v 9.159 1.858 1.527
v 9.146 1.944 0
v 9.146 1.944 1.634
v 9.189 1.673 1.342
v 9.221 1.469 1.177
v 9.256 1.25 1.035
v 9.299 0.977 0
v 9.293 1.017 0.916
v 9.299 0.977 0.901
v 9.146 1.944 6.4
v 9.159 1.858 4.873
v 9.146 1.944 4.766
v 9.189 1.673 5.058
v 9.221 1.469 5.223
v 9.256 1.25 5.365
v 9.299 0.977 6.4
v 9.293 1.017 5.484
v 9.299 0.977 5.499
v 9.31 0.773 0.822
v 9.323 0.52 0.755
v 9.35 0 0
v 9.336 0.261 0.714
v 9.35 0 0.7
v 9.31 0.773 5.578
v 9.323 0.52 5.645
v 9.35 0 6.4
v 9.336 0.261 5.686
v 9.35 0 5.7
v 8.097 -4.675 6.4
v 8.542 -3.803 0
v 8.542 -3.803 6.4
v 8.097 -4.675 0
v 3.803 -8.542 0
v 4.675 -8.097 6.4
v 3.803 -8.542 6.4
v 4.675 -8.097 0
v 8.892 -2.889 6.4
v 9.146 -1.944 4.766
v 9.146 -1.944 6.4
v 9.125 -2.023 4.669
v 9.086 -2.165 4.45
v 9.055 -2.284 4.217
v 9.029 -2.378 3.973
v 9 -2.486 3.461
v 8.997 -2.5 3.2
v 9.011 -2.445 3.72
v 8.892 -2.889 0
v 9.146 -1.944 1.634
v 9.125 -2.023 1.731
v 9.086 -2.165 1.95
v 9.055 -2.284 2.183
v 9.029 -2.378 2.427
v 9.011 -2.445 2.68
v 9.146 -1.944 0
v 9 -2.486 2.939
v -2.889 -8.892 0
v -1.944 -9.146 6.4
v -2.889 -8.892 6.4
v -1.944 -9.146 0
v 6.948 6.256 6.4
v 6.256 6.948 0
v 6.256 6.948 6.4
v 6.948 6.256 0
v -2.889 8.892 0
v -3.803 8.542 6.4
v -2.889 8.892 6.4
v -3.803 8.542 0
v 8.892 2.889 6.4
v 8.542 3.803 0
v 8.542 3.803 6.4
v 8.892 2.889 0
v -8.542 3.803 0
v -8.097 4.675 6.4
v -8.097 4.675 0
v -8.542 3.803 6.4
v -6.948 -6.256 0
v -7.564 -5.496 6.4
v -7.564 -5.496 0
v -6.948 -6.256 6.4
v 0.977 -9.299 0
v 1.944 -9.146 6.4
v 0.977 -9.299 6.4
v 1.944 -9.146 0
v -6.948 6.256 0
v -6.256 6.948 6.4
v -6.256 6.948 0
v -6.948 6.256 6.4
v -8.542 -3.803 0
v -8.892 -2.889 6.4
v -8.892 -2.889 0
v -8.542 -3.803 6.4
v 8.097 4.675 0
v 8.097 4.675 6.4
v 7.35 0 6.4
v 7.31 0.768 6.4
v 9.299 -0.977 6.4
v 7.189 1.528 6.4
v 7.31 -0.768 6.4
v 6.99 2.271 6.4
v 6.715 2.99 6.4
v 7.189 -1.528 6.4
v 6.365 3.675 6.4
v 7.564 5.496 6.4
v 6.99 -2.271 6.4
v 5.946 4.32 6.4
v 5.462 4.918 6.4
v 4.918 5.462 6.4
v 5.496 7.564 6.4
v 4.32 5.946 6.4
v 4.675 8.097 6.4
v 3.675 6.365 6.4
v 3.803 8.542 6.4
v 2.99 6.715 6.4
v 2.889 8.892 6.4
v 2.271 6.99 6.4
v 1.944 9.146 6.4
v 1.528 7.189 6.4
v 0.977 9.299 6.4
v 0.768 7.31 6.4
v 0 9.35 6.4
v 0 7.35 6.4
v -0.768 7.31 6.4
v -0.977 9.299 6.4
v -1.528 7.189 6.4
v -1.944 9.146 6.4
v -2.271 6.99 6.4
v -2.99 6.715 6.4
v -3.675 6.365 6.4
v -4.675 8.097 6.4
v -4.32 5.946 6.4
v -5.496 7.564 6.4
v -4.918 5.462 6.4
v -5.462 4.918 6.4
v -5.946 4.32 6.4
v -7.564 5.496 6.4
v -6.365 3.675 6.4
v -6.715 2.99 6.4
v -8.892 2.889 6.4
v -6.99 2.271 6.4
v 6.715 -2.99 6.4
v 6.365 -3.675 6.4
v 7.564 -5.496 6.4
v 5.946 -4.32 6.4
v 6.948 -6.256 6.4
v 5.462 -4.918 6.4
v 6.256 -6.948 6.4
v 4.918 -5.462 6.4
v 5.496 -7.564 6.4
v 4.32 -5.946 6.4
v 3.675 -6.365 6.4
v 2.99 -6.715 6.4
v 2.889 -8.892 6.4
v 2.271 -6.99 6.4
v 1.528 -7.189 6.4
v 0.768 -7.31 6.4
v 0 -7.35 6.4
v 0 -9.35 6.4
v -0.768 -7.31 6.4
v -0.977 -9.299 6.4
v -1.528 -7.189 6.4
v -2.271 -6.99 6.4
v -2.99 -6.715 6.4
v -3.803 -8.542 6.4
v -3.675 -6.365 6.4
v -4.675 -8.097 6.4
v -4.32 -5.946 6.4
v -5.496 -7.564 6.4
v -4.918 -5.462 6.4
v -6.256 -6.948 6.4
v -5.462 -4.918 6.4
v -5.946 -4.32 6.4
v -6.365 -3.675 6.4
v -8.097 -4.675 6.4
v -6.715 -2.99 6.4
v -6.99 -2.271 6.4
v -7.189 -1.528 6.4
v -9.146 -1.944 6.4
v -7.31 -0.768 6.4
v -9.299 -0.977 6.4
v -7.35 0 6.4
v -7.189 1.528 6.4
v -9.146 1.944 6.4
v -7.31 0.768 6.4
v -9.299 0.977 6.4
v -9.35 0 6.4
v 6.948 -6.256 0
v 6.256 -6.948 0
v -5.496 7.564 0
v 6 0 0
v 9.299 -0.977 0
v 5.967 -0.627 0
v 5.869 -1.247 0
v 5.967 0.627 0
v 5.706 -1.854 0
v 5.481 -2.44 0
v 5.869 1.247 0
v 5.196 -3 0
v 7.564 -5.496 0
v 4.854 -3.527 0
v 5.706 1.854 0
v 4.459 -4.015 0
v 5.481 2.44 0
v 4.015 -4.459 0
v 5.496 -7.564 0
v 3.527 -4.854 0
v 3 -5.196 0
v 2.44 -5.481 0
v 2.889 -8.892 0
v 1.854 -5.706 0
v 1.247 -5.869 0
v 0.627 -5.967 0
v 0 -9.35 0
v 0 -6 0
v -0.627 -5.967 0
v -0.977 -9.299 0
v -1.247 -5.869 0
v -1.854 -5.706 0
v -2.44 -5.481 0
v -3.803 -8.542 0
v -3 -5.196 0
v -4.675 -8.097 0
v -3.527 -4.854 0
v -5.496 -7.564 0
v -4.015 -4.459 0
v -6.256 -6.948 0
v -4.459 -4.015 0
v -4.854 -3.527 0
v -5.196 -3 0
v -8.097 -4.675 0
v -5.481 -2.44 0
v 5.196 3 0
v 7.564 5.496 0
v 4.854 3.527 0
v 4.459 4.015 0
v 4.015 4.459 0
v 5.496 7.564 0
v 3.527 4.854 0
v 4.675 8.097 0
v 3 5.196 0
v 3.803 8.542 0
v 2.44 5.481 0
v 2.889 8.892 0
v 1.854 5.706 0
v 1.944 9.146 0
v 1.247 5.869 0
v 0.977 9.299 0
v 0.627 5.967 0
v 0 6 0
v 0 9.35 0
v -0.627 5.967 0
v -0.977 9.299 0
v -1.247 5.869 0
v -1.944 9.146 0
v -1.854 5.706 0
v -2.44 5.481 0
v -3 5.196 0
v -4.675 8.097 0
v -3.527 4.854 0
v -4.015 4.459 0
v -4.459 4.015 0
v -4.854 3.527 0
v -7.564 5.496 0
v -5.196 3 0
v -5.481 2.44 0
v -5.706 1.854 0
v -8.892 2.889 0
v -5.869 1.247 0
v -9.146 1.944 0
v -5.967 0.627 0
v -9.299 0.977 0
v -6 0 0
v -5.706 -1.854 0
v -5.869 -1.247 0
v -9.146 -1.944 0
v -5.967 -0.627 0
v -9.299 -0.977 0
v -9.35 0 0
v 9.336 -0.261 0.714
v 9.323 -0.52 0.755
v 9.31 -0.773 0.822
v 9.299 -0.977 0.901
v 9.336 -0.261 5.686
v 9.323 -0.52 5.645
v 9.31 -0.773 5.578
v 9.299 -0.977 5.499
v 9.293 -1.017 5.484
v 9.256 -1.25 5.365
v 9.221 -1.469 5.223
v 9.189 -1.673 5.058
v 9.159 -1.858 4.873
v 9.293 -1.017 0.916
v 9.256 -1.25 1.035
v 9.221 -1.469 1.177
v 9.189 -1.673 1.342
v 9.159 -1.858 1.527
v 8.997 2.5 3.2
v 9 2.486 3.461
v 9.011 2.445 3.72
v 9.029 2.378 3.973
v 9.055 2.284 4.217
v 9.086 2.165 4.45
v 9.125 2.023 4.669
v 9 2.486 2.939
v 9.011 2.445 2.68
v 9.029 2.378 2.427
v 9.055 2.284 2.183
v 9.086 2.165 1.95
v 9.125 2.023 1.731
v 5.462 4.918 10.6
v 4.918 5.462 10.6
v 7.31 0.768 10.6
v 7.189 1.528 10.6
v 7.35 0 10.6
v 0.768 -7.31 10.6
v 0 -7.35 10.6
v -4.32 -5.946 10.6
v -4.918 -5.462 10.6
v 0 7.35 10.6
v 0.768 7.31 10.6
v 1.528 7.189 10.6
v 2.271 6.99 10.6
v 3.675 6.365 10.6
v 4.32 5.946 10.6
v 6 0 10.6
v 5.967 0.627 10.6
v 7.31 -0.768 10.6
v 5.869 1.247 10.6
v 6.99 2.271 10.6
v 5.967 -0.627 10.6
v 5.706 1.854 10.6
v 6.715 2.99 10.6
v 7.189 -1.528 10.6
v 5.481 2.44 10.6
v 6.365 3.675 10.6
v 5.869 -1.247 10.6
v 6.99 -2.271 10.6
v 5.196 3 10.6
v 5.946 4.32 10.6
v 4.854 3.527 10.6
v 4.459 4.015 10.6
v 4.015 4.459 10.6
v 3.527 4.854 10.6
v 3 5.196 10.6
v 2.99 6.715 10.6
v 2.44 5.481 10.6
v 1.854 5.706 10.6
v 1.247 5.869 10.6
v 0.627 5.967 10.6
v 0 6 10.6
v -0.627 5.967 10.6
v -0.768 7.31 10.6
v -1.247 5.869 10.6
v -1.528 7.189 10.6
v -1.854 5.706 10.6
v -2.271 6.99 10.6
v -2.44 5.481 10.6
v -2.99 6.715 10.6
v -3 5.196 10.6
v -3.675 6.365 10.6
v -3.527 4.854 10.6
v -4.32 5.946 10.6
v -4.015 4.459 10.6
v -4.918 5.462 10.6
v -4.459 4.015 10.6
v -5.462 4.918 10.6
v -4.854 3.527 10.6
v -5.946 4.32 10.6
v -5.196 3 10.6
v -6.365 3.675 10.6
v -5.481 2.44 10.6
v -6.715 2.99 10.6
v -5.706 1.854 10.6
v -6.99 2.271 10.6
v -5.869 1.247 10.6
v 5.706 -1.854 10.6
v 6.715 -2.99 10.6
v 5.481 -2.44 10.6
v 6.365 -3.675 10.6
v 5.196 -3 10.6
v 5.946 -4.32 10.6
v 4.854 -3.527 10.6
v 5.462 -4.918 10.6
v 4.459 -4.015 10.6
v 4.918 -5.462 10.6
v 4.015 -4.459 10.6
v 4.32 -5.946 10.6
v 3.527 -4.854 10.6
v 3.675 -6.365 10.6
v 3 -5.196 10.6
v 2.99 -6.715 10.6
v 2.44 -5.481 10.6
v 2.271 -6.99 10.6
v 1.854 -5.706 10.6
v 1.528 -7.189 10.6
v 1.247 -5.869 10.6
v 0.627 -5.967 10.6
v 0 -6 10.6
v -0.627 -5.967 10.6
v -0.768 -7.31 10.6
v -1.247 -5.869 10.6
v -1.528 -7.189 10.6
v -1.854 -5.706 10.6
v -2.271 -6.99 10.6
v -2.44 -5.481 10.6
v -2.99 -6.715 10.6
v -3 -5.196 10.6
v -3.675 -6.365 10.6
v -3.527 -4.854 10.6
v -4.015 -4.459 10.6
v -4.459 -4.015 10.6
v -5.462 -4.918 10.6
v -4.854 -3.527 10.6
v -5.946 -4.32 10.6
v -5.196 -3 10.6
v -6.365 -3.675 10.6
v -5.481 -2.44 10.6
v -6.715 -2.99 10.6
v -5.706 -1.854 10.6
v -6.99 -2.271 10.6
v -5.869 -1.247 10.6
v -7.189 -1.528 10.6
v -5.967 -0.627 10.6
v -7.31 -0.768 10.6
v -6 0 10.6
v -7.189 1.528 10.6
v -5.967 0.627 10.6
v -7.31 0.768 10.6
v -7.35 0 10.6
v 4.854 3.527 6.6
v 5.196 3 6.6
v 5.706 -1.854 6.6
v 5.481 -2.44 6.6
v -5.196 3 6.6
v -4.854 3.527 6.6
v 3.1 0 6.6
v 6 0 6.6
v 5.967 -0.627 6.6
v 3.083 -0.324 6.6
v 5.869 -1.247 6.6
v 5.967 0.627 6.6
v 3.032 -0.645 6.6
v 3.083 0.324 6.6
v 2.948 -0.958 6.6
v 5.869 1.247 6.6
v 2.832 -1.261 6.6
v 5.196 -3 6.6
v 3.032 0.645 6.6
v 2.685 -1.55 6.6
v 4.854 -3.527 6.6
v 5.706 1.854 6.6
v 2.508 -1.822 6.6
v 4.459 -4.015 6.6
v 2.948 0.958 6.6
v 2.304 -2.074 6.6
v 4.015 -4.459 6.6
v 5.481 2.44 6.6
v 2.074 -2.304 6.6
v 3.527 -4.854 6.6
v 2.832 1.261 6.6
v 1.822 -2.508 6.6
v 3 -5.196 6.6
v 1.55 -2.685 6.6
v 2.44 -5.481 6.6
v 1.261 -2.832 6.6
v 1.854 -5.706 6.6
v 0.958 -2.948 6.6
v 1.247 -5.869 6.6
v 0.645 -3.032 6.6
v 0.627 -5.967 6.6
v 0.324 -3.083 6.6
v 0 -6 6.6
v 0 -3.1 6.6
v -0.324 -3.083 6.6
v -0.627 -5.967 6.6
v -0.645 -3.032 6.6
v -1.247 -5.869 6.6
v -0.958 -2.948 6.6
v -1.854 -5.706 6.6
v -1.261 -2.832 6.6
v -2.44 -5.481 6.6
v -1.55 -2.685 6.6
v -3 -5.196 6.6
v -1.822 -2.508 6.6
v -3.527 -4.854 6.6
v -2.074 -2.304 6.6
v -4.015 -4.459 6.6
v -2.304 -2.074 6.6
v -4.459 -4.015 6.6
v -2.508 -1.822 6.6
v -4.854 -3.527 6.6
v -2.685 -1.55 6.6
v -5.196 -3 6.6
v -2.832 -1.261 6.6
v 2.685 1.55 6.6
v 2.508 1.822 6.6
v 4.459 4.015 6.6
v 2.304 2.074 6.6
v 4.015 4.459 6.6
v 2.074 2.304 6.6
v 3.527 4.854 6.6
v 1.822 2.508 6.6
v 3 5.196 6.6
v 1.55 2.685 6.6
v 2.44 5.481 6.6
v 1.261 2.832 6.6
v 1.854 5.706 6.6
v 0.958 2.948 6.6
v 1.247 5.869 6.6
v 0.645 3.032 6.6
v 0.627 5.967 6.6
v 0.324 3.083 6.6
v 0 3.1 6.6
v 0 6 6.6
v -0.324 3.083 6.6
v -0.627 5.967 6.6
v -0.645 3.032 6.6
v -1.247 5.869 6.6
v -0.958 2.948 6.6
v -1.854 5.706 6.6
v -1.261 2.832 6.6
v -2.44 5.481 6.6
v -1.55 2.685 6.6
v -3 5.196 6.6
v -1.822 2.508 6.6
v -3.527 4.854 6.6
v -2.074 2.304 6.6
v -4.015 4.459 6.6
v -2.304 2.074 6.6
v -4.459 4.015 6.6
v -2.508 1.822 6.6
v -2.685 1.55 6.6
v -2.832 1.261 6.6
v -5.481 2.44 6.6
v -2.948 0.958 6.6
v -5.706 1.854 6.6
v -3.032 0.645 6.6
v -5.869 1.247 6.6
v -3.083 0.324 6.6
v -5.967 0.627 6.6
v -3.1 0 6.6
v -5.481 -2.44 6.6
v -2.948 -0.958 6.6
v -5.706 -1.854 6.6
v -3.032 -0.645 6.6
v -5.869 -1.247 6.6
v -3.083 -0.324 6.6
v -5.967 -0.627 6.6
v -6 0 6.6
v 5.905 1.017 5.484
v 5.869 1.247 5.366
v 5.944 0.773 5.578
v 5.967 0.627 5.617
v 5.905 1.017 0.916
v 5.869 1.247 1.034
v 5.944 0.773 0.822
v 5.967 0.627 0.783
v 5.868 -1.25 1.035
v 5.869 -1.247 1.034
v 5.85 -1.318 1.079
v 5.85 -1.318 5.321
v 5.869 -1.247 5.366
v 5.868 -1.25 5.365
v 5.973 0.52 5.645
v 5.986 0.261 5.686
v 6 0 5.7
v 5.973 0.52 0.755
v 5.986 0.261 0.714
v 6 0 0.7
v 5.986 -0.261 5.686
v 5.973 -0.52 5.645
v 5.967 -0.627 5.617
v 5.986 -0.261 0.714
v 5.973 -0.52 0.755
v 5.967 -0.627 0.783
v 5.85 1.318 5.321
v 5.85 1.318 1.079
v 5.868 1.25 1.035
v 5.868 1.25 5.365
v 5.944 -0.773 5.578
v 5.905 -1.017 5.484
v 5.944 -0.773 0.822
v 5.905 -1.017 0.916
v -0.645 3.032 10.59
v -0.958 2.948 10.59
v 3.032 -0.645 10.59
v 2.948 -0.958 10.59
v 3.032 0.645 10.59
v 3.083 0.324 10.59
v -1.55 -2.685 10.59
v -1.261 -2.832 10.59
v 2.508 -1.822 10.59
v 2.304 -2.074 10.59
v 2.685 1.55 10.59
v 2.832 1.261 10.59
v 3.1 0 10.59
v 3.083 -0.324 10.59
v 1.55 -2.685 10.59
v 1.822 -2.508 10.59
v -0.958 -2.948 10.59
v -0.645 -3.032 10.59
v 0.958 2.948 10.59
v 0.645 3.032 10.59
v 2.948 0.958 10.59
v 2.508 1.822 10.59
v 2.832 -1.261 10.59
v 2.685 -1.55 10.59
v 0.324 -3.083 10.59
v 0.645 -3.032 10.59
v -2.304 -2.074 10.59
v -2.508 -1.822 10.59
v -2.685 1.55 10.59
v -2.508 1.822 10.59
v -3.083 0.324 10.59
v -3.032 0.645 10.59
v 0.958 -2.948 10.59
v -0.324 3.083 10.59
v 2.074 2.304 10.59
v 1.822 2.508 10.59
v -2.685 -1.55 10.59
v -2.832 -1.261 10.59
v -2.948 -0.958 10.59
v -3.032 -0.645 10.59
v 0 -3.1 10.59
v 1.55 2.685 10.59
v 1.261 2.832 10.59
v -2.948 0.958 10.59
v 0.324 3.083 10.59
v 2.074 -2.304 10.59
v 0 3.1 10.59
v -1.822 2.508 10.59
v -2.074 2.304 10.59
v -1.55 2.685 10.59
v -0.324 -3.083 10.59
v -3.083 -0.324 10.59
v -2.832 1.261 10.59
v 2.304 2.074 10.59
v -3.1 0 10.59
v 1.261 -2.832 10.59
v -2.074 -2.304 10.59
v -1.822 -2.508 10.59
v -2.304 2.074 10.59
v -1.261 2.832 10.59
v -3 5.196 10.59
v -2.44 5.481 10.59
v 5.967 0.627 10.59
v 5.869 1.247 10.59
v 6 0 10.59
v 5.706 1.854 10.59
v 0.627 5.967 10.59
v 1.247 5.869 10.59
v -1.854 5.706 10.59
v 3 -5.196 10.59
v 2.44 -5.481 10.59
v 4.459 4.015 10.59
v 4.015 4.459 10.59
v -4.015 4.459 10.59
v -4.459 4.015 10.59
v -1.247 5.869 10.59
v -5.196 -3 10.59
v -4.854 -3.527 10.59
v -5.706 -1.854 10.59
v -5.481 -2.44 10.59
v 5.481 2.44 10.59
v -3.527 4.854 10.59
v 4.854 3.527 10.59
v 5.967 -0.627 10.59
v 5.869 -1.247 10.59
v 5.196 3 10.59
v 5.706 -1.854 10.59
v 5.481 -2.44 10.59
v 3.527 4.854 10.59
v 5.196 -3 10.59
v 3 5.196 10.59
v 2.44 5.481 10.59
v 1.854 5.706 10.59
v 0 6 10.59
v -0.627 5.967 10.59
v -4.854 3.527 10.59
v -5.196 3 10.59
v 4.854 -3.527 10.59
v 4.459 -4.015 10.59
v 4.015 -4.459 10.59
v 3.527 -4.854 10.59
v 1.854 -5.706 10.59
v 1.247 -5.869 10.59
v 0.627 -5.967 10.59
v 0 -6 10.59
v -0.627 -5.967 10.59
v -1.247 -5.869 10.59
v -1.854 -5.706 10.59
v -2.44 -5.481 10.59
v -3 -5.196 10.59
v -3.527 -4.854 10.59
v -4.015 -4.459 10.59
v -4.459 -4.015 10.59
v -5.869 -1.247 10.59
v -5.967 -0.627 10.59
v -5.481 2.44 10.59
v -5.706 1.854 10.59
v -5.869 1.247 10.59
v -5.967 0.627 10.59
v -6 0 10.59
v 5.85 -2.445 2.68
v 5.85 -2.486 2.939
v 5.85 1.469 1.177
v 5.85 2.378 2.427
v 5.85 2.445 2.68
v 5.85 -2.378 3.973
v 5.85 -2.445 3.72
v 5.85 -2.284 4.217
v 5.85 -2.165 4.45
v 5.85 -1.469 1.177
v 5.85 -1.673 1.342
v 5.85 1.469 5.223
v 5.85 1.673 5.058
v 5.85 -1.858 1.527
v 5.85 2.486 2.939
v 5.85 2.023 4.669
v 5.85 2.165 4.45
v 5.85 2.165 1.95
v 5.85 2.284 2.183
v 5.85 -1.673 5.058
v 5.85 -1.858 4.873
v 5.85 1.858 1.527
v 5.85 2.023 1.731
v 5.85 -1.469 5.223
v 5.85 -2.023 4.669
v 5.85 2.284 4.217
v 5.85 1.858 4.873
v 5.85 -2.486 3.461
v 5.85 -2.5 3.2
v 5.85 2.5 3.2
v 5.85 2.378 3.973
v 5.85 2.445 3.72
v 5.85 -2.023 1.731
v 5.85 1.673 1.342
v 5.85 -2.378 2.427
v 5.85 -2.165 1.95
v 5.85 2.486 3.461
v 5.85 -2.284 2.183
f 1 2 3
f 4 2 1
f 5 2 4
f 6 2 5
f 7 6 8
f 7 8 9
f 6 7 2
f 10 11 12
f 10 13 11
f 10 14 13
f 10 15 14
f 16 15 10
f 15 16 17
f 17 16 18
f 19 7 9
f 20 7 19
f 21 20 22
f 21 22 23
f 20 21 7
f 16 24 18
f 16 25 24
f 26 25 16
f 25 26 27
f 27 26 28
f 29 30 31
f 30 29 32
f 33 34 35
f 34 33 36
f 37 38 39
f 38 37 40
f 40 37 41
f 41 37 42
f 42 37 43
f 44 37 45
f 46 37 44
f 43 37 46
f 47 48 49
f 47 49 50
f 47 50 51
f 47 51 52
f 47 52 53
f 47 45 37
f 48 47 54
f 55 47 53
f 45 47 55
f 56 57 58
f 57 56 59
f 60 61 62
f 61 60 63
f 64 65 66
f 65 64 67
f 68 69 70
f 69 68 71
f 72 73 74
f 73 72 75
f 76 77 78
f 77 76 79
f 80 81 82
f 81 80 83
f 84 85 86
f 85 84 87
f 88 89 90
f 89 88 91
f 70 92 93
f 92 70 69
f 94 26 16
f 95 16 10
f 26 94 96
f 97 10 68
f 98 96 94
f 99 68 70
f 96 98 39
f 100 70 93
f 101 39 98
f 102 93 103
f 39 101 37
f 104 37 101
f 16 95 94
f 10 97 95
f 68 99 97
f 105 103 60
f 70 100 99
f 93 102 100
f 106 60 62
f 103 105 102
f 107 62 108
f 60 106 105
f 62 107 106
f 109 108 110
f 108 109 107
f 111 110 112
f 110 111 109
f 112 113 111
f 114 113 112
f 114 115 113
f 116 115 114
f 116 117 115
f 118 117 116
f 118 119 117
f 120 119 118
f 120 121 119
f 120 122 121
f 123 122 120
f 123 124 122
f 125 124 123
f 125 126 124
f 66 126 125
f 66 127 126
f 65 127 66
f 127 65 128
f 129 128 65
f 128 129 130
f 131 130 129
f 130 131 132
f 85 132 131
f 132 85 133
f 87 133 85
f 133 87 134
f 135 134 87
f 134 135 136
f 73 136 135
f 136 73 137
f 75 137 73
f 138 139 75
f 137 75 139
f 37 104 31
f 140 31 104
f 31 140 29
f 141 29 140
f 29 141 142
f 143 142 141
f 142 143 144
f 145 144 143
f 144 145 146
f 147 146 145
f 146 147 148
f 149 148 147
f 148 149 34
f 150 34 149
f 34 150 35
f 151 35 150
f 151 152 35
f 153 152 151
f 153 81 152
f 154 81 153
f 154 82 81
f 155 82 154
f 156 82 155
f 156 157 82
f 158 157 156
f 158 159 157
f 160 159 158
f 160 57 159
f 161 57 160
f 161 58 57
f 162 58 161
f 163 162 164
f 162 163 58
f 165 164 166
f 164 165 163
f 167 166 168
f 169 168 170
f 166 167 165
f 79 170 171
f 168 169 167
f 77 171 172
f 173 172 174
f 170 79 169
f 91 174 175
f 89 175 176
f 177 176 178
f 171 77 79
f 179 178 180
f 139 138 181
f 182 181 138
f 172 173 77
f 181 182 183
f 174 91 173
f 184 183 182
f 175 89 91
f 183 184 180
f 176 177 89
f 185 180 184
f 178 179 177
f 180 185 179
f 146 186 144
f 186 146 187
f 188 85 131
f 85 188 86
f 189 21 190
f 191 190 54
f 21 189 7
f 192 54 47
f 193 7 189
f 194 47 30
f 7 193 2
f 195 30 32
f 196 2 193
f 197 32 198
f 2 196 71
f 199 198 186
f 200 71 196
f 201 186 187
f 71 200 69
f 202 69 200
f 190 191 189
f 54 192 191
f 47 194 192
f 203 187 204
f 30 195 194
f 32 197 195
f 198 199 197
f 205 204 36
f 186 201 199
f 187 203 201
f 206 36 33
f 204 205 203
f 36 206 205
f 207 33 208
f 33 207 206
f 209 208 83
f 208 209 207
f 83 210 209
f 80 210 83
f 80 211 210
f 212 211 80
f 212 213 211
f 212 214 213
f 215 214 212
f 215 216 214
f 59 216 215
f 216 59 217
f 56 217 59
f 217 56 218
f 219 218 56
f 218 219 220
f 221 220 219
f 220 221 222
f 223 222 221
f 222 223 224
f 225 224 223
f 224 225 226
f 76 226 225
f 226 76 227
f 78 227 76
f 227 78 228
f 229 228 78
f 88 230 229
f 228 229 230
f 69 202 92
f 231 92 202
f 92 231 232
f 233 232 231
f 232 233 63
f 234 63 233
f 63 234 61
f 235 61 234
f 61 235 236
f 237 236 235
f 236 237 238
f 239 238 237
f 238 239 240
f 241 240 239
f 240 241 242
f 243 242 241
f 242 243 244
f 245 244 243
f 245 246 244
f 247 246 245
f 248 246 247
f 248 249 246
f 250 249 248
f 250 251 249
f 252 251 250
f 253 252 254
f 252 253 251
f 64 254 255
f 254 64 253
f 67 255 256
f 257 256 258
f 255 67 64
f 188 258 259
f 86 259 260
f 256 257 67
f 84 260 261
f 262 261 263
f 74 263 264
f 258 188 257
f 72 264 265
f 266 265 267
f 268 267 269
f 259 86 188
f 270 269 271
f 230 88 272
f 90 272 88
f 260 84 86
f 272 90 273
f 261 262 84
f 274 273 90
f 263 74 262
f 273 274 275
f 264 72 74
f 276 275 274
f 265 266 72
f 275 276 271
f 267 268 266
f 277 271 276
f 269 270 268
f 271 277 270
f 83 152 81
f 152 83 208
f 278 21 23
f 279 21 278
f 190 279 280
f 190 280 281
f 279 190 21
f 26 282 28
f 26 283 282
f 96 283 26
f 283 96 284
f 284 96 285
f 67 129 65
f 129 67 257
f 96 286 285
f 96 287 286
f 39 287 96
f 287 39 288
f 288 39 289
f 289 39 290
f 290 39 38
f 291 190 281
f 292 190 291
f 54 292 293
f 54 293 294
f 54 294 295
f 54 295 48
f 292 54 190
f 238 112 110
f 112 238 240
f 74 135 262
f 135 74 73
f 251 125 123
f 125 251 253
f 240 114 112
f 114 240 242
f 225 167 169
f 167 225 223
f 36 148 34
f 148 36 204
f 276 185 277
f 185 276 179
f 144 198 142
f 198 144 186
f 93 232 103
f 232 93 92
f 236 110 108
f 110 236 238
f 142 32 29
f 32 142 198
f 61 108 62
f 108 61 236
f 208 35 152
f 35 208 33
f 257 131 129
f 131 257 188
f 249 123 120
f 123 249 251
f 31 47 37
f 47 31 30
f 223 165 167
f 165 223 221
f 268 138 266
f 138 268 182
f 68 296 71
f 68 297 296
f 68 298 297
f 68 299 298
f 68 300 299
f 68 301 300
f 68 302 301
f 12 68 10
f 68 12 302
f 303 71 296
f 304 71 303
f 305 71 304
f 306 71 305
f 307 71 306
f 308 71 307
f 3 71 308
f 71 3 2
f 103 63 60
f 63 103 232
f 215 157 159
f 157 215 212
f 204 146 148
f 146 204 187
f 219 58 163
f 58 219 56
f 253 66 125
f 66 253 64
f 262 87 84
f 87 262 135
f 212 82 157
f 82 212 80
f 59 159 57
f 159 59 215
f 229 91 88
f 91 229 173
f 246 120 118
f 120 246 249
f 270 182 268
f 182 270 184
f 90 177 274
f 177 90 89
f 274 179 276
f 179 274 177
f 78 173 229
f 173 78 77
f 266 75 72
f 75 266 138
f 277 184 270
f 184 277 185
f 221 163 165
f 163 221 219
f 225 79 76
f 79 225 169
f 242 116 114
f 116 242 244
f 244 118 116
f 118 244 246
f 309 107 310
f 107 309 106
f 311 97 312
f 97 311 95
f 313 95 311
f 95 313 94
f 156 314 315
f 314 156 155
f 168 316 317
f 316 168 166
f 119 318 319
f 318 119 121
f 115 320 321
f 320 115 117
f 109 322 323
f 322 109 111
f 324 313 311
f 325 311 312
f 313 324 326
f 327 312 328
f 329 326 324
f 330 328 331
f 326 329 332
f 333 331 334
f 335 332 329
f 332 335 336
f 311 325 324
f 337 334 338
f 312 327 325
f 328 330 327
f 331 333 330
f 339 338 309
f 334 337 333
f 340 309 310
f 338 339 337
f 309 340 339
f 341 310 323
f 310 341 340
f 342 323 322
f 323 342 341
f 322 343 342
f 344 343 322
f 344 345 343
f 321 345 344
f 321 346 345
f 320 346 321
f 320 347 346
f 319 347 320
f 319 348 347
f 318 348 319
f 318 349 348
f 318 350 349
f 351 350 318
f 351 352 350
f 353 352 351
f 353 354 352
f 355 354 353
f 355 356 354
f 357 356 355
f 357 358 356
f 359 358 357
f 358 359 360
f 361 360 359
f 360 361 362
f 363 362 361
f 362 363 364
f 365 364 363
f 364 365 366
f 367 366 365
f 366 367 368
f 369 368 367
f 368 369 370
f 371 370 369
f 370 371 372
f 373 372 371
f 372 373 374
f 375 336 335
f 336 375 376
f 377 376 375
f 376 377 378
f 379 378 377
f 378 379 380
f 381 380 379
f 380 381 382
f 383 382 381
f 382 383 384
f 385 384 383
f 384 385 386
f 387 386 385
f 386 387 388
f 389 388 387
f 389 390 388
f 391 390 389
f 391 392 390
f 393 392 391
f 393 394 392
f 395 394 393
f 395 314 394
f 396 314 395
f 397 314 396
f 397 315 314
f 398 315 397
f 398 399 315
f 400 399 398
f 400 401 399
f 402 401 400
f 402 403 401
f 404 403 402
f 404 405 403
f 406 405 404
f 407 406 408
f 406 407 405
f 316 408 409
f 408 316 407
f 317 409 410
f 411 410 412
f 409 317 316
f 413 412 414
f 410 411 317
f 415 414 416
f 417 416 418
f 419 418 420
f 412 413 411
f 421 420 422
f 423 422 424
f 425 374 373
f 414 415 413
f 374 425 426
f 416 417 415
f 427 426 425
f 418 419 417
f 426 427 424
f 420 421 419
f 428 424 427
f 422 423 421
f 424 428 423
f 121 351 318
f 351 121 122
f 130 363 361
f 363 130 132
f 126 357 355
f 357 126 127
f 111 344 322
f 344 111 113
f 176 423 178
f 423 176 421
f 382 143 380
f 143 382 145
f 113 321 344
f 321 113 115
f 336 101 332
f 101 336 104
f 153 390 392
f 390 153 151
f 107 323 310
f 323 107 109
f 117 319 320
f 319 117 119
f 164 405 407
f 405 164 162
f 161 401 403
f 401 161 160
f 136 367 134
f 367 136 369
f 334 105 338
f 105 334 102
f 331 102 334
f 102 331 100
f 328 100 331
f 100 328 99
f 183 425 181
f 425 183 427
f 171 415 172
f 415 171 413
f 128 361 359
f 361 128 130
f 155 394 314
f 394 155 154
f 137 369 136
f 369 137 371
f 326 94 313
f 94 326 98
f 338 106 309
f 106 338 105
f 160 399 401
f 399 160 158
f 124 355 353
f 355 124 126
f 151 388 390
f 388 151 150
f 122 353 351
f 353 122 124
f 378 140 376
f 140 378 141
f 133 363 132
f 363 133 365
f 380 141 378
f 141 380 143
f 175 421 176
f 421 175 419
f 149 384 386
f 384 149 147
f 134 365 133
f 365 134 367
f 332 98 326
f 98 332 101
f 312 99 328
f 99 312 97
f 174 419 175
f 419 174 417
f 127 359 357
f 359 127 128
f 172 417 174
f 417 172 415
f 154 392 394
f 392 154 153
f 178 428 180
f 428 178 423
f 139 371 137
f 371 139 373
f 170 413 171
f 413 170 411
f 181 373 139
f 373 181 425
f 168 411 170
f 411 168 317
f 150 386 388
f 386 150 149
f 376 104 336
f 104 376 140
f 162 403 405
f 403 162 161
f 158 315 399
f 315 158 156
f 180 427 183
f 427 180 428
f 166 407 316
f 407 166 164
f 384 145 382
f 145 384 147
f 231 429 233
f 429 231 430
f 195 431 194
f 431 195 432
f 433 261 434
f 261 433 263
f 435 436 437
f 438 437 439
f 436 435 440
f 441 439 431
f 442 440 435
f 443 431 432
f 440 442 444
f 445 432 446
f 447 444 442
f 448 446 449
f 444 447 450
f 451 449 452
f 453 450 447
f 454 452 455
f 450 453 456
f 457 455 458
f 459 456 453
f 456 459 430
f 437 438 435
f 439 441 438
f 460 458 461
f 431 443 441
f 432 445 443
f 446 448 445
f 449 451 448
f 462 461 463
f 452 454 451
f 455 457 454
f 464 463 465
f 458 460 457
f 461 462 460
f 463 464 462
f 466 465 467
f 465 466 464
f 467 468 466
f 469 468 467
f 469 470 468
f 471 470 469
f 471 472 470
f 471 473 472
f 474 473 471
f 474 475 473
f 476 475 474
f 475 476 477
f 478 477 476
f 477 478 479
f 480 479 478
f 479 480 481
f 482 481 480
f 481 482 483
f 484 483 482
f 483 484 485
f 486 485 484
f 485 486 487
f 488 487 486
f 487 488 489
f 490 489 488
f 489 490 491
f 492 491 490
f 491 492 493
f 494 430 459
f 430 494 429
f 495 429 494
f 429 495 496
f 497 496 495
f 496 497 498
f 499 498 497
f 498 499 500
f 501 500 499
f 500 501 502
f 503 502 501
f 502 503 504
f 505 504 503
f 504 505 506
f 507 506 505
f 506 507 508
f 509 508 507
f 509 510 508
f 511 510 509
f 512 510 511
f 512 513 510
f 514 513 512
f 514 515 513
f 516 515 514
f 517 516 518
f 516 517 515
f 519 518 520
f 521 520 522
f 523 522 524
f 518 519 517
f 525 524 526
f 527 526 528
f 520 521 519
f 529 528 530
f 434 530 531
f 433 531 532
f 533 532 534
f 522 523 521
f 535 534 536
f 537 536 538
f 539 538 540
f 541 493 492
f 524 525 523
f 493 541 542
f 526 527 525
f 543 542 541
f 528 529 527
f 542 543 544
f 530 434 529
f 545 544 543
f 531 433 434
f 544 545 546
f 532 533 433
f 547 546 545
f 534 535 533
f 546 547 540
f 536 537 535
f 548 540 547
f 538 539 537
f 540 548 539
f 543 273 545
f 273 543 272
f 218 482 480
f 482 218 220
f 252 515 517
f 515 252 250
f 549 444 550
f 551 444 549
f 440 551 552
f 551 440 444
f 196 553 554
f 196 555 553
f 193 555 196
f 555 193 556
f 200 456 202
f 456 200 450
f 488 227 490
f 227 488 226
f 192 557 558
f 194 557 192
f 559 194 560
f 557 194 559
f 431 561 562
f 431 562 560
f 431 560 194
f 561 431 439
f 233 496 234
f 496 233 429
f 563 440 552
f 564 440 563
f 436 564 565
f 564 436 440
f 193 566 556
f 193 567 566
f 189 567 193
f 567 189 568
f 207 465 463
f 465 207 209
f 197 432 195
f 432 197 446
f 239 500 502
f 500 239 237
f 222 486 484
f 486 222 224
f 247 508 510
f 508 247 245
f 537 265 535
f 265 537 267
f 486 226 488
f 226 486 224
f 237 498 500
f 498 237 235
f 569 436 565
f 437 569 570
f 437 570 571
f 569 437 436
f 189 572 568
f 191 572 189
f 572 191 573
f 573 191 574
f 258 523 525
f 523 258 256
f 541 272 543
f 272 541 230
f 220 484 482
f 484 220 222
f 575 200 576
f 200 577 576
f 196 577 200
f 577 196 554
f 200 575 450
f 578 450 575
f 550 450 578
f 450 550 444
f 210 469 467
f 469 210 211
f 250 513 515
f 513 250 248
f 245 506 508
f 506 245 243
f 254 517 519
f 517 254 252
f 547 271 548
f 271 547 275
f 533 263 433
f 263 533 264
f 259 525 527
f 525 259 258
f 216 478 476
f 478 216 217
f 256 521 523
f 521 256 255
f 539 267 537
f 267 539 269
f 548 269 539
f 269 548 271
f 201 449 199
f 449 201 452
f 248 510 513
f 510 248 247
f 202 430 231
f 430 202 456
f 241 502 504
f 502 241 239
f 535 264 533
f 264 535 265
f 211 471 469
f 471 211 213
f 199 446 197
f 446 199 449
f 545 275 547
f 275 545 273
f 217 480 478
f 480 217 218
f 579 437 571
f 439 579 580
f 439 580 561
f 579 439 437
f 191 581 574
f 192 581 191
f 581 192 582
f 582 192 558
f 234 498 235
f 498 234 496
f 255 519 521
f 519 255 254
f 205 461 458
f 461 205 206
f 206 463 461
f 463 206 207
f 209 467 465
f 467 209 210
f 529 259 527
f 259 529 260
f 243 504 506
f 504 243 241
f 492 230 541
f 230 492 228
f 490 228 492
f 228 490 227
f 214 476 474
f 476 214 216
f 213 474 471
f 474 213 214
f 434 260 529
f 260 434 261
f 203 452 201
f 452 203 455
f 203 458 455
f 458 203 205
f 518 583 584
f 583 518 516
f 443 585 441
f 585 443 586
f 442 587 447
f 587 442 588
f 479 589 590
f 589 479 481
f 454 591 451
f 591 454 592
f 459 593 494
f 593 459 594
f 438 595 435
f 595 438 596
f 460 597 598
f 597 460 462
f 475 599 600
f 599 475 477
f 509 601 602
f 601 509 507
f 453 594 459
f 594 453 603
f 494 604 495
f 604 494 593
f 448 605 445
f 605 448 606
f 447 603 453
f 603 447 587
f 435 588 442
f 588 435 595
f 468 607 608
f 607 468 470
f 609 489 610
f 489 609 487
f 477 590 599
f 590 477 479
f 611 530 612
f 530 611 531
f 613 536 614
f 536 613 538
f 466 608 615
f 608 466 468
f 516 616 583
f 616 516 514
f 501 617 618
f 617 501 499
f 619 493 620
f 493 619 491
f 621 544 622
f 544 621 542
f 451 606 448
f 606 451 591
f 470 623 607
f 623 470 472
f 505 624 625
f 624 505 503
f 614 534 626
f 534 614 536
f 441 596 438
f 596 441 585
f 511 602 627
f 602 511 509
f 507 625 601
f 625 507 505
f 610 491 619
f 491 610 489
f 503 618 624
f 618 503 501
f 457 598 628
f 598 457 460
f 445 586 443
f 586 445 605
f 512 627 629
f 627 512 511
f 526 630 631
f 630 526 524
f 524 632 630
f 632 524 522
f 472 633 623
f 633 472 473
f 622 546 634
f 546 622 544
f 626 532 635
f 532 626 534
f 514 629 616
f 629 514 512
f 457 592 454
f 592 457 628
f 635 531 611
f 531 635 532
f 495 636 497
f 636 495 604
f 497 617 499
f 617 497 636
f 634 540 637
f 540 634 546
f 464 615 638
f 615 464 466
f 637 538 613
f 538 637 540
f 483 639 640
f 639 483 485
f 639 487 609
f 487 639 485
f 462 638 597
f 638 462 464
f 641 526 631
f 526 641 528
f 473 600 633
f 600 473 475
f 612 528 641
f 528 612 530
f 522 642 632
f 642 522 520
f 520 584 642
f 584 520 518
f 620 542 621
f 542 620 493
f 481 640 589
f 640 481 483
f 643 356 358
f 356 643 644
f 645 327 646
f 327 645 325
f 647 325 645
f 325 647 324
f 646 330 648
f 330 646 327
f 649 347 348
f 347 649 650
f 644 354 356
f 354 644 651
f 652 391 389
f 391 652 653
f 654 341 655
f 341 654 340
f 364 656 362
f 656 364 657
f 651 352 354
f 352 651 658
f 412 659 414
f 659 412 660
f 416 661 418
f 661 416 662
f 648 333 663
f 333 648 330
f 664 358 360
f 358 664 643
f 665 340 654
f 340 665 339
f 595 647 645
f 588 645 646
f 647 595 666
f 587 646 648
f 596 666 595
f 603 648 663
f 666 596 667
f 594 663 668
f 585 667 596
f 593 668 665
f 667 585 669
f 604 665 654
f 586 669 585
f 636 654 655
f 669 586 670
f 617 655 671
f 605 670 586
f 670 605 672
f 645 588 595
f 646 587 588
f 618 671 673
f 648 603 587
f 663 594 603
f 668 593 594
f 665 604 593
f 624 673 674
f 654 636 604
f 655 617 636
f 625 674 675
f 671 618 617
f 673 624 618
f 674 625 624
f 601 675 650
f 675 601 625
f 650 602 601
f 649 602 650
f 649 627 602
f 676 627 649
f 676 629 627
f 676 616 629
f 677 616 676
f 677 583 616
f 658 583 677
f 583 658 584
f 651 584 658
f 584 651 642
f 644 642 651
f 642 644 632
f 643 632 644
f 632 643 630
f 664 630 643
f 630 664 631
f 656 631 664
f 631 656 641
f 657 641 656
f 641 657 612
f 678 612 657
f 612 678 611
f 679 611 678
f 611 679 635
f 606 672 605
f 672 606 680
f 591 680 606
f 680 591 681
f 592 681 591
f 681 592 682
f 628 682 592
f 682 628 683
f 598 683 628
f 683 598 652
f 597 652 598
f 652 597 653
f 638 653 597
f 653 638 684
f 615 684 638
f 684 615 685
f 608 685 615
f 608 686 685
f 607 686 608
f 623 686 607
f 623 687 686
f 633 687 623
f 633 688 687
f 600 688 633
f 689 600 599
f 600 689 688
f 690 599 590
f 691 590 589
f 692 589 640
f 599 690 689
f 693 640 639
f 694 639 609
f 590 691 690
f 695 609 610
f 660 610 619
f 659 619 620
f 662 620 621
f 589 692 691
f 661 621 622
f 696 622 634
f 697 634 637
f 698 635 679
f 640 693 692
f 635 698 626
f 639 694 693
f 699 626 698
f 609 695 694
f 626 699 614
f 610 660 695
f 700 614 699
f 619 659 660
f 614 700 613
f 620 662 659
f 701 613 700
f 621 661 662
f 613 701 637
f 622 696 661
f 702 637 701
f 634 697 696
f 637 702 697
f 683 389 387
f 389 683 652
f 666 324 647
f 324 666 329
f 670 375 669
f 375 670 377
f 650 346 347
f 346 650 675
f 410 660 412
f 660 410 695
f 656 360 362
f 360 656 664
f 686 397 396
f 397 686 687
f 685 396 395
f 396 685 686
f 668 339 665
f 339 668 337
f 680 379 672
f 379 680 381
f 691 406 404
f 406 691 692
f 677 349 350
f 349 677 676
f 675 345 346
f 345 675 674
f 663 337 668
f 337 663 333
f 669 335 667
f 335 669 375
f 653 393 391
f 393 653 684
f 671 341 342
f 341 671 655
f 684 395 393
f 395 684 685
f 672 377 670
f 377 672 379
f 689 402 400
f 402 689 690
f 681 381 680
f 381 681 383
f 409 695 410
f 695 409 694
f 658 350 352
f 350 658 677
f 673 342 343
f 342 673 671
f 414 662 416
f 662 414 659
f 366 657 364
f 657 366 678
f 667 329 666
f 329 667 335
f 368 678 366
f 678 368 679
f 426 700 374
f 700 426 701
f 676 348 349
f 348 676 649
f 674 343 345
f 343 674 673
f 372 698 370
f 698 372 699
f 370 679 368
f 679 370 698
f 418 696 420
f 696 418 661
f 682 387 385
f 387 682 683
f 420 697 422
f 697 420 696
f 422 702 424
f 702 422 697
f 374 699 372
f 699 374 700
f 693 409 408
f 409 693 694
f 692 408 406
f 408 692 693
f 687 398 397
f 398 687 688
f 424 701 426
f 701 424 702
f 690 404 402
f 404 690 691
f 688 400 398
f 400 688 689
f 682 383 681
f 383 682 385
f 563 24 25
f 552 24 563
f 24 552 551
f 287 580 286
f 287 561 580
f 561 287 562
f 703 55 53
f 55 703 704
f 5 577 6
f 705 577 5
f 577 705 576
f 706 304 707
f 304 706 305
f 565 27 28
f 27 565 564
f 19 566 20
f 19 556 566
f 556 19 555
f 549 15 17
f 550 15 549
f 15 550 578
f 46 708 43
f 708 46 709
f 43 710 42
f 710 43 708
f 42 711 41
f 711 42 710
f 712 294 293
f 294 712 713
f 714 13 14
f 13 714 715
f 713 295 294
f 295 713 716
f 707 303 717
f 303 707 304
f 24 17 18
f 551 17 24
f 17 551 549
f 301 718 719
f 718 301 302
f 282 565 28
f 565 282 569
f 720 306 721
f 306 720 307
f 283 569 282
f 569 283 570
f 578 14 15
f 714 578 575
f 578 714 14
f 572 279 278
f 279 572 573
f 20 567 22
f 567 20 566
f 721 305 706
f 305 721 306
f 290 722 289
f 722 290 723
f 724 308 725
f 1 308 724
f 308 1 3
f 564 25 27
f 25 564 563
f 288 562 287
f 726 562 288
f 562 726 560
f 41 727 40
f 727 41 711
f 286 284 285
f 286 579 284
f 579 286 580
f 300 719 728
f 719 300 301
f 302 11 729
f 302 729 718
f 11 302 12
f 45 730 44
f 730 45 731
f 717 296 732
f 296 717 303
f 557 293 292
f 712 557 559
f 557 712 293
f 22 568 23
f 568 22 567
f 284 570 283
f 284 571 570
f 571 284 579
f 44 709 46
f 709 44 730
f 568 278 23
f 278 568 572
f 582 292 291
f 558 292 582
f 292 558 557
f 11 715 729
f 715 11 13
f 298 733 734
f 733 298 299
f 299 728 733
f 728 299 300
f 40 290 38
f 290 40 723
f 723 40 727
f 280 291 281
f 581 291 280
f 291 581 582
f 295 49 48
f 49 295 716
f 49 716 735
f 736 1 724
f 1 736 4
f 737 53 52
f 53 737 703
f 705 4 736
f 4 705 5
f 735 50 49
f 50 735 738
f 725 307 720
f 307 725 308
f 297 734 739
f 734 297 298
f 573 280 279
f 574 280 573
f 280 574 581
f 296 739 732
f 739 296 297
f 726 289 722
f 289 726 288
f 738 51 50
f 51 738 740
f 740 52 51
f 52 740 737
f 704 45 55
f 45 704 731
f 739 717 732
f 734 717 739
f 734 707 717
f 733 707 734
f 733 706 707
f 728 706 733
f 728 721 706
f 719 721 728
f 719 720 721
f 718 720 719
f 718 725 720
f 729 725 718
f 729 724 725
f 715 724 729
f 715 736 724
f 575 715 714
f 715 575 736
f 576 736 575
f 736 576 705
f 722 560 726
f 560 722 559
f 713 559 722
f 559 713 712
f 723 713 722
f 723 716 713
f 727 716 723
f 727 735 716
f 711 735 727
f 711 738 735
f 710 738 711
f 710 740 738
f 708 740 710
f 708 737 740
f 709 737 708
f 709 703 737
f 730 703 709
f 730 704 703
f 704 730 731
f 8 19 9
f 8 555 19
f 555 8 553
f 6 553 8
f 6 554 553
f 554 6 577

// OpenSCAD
// thermokoppel insert

// m6
m6d=6;
m6h=6; // height of locking nut

// kopper insert 1/2" (21,34mm outside diameter)
// start from outside big parts to inside the tube
d1=19-0.3;
h1=6.4;
d2=15-0.3;
h21=14.6;
h22=16.6;
d3=9;
h3=45.5; 

// locking screw
lsd=5;
lsh=3.5;

// m6 thermokoppel
td1=m6d+0.2;
td2=11.2+0.8; // nut needs 9.9-11.2mm spacing
th=10;
tnh=4;

// other definitions
$fn=60;
m=4;
debug=0;


difference() {
    union() {
        cylinder(h=h1, d=d1);
        cylinder(h=h22-th+m, d=d2);
    }
    
    // thermokoppel
    translate([0,0,-0.01])
        cylinder(h=h22-th+0.01,d=td2);
    cylinder(h=h21+0.02,d=td1);
    translate([0,0,h22-m6h-0.01])
        cylinder(h=m6h,d=td2);
    
    // locking screw
    translate([d1/2,0,h1/2])
        rotate([0,-90,0]) 
        cylinder(h=lsh, d=lsd);
    
    // debug peek inside
    if (debug) {
        translate([0,0,-0.1])
            cube([d1+0.1,d1+0.1,h3+0.2]);    
    }
}

if (debug) {
    translate([0,0,h22-th-tnh]) {
        #cylinder(h=tnh,d=11,$fn=6);
        translate([0,0,tnh+m])
            #cylinder(h=6,d=11,$fn=6);
        translate([0,0,4])
            #cylinder(h=th,d=td1);
        translate([0,0,-4])
        #cylinder(h=4+th+8,d=3.8);
        translate([0,0,th+6])
            #cylinder(h=2,d=4.5);
    }
}
